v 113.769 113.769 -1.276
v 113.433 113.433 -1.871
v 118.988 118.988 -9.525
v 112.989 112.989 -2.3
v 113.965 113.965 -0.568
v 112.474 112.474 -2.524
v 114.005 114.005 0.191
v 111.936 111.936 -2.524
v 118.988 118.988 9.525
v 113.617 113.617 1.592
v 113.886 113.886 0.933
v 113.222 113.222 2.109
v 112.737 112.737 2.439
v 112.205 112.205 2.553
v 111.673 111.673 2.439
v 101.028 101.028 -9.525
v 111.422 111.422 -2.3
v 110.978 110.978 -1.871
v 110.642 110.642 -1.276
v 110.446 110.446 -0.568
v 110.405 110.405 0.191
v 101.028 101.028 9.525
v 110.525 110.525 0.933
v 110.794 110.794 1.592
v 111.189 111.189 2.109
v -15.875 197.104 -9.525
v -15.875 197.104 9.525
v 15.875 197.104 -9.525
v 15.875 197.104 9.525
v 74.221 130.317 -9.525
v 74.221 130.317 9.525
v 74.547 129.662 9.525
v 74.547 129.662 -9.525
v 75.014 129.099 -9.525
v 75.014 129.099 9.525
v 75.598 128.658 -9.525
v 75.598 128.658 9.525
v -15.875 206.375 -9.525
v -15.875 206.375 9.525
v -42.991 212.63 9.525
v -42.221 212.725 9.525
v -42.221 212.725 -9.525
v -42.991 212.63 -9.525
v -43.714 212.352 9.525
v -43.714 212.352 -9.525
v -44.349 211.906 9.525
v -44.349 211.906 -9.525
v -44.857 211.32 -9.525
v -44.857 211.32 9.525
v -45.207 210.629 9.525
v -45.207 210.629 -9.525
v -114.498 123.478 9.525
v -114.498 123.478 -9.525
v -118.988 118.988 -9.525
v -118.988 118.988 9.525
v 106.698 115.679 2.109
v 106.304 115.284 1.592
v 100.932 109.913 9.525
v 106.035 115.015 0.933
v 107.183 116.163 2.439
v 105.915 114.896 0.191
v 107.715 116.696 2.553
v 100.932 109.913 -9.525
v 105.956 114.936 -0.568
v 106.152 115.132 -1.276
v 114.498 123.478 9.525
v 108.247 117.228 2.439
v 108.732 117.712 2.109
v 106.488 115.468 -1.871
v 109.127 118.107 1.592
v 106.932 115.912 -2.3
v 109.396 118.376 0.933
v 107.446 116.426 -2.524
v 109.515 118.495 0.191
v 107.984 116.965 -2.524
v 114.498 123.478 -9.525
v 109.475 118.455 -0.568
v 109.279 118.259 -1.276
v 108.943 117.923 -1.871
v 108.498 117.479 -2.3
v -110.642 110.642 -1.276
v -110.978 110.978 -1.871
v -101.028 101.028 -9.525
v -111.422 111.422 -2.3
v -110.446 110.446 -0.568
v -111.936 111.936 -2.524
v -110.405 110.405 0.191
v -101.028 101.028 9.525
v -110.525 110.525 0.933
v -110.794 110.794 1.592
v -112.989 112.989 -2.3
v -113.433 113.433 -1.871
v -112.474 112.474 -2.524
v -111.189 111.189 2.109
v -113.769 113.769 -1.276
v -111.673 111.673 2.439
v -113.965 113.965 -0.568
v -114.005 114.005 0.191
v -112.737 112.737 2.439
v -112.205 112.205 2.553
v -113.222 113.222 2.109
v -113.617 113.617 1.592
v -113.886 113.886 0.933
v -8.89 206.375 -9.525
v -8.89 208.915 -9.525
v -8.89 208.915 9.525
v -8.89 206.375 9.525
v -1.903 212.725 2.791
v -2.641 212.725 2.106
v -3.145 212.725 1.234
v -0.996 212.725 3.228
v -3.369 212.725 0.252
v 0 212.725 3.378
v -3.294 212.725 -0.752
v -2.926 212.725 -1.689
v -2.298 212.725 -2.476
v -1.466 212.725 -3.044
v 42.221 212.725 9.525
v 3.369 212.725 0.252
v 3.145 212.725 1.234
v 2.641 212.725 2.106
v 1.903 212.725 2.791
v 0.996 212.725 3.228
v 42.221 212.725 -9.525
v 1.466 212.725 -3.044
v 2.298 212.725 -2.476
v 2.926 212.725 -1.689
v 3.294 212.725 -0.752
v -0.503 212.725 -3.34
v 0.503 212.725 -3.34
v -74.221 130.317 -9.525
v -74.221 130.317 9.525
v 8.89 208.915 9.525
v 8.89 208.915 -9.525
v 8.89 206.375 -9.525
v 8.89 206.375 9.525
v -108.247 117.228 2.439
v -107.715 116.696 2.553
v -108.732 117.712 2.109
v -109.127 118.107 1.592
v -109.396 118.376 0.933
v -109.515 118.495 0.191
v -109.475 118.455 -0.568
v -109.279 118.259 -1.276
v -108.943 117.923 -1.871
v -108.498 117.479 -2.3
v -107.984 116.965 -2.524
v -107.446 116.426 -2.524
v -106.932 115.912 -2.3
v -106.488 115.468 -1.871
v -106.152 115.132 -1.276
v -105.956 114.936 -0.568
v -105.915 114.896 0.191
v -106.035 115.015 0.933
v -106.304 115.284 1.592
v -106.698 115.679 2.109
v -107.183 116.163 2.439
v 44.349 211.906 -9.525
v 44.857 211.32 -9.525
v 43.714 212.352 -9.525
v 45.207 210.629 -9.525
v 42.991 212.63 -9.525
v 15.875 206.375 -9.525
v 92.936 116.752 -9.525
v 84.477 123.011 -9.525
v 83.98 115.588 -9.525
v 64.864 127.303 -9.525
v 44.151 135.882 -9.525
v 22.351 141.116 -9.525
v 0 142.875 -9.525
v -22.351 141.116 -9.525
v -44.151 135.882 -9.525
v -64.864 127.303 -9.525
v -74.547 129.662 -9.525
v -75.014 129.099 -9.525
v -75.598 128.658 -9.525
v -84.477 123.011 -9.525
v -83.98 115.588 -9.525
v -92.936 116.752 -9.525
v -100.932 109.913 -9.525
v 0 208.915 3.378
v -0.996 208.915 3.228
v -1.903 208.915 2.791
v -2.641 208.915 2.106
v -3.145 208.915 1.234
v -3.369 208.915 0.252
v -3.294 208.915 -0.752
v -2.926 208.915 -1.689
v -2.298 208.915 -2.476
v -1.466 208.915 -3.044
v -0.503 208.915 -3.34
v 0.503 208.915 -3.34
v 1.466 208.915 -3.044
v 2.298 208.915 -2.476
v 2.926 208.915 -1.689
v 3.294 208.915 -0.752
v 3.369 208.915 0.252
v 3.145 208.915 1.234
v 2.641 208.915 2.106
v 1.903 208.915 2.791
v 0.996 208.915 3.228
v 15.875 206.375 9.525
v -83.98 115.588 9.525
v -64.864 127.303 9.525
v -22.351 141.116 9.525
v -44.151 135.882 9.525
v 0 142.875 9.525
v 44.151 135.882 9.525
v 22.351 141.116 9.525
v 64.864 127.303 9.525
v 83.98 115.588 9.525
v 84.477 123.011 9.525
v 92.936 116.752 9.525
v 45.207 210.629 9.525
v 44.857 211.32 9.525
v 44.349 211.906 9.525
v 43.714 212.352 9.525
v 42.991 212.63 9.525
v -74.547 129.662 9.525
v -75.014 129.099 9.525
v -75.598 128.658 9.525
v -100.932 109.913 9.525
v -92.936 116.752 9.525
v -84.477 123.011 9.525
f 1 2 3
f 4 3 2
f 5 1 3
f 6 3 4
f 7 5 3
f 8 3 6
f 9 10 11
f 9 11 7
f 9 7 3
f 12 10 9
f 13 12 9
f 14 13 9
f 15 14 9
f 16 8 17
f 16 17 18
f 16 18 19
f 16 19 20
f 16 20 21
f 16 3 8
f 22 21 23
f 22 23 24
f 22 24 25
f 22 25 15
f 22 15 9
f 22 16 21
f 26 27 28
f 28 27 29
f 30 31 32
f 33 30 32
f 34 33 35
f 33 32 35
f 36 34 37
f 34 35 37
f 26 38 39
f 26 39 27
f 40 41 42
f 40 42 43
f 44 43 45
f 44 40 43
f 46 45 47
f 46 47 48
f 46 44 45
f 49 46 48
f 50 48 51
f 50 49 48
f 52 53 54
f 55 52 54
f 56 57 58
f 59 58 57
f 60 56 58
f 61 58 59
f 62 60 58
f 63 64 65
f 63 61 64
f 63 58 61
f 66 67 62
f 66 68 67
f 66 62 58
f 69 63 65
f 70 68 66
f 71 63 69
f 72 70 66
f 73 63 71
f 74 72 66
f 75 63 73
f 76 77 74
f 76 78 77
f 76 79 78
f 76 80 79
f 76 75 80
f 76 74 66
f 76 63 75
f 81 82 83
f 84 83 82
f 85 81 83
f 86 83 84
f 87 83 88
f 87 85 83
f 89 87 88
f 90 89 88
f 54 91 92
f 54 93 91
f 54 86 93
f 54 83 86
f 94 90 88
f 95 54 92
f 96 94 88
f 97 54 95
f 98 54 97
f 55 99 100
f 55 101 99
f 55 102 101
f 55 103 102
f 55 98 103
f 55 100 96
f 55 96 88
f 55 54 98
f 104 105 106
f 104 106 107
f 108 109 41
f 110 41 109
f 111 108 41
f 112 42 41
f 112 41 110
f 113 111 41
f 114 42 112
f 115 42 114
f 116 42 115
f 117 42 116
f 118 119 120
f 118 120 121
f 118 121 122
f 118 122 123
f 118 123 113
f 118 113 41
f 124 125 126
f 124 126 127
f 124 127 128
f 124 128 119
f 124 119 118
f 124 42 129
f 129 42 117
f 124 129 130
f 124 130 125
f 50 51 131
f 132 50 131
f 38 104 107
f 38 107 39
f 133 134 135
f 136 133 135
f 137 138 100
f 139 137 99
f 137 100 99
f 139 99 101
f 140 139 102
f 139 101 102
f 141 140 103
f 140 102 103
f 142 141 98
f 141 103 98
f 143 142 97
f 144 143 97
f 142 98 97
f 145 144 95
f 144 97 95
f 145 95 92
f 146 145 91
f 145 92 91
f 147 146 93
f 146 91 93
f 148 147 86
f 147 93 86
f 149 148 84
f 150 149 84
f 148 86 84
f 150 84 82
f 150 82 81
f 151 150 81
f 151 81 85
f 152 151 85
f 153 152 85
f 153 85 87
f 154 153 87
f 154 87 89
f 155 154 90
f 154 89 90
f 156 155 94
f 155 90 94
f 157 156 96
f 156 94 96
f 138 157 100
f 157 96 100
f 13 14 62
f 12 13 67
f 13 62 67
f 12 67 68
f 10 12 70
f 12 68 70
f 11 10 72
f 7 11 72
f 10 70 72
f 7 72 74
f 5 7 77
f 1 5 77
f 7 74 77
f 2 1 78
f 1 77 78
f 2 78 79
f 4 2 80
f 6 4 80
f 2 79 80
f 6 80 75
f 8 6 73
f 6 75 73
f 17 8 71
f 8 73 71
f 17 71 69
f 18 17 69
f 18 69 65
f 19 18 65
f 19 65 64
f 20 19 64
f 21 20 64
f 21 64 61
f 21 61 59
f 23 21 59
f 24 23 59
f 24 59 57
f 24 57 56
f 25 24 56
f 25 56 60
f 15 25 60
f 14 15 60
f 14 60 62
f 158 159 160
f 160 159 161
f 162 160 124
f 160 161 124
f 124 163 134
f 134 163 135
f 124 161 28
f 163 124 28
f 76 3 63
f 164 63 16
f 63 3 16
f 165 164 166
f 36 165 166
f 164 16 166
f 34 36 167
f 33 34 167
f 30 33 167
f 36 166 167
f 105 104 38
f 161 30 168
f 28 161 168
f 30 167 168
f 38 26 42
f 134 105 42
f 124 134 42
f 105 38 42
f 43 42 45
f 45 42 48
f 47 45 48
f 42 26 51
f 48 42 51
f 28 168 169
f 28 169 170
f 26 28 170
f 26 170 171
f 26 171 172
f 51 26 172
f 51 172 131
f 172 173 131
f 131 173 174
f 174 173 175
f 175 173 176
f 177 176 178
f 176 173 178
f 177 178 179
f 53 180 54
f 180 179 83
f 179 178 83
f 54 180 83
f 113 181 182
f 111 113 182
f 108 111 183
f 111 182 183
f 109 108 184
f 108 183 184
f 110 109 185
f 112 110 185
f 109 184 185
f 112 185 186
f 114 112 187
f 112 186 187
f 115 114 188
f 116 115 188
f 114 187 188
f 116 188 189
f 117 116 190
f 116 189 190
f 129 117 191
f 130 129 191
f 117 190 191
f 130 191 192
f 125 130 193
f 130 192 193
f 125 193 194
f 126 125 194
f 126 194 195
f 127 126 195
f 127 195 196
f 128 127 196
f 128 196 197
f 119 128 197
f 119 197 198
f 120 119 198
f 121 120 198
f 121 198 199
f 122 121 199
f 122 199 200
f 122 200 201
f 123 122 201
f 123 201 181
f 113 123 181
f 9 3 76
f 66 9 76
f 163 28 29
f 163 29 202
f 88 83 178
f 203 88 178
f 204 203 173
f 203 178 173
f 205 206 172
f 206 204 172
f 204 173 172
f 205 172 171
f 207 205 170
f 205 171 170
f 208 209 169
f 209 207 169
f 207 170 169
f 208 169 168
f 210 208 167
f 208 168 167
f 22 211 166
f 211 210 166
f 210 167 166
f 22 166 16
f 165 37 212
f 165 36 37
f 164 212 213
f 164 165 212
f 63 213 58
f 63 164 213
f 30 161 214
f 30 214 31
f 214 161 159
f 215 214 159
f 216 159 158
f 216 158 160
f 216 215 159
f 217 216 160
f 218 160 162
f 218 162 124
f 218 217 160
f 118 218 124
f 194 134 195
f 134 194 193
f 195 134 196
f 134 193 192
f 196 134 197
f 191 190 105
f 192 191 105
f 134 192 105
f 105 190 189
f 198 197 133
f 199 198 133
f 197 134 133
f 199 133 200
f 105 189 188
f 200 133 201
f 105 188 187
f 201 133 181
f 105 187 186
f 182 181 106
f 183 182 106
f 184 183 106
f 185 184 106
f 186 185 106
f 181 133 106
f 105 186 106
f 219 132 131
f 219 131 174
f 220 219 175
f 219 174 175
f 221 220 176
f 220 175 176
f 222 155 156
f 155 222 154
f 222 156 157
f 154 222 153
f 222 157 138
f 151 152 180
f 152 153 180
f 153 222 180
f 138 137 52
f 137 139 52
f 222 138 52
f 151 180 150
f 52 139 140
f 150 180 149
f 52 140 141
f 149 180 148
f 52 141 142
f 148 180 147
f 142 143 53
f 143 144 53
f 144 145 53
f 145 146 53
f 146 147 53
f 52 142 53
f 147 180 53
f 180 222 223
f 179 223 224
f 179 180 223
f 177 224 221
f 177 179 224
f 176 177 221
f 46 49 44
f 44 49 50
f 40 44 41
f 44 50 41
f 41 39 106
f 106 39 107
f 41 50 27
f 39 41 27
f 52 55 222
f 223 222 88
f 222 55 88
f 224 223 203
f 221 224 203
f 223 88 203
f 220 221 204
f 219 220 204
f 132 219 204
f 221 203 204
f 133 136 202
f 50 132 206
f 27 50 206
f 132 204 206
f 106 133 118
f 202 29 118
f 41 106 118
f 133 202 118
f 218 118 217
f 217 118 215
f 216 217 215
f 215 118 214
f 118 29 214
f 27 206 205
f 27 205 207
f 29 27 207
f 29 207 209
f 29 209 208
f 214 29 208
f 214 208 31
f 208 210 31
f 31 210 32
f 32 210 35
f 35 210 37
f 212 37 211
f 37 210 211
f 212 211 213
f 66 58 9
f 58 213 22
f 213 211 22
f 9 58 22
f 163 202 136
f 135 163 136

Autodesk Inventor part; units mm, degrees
ref_plane "YZ Plane" through (0, 0, 0) normal (1, 0, 0) x (0, 1, 0)
ref_plane "XY Plane" through (0, 0, 0) normal (0, 0, 1) x (1, 0, 0)
sketch "Sketch1" plane through (0, 0, 0) normal (0, 0, 1) x (1, 0, 0)
  circle A0 centre (0, 0) radius 142.875
  circle A1 centre (0, 0) radius 149.225
  dimension "innerDiameter" = 285.75
  dimension "outerDiameter" = 298.45
extrude "Extrusion1" add sketch "Sketch1" along normal mid plane 19.05
sketch "Sketch2" plane through (0, 0, 0) normal (0, 0, 1) x (1, 0, 0)
  circle A0 centre (0, 0) radius 142.875 construction
  line L0 (0, 142.875) -> (0, 149.225) construction
  circle A1 centre (0, 0) radius 149.225 construction
  line L1 (0, 142.875) -> (44.45, 142.875)
  line L2 (44.45, 142.875) -> (44.45, 149.225)
  line L3 (44.45, 149.225) -> (19.05, 149.225)
  line L4 (0, 142.875) -> (-44.45, 142.875)
  line L5 (-44.45, 142.875) -> (-44.45, 149.225)
  line L6 (-44.45, 149.225) -> (19.05, 149.225)
  line L7 (371.6693, 35.081) -> (0, 0)
  dimension "halfBaseWidth" = 44.45
  dimension "baseThickness" = 6.35
  dimension "baseHeight" = 0
extrude "Extrusion2" add sketch "Sketch2" along normal mid plane 19.05
sketch "Sketch5" plane through (-44.45, 149.225, 9.525) normal (0, 1, 0) x (1, 0, 0)
  line L0 (0, 19.05) -> (0, 0) projected
  line L1 (88.9, 19.05) -> (88.9, 0) projected
  line L2 (0, 0) -> (88.9, 0)
  line L3 (88.9, 0) -> (88.9, 19.05)
  line L4 (88.9, 19.05) -> (0, 19.05)
  line L5 (0, 19.05) -> (0, 0)
  point P0 (44.45, 9.525)
  point P1 (0, 19.05)
extrude "Extrusion3" add sketch "Sketch5" along normal blind 63.5
sketch "Sketch7" plane through (0, 0, 9.525) normal (0, 0, 1) x (1, 0, 0)
  line L0 (-44.45, 142.875) -> (-44.45, 212.725) projected
  line L1 (-44.45, 212.725) -> (44.45, 212.725) projected
  line L2 (44.45, 142.875) -> (44.45, 212.725) projected
  line L3 (0, 212.725) -> (0, 149.1868) construction
  line L4 (-15.875, 197.104) -> (15.875, 197.104)
  line L5 (15.875, 197.104) -> (15.875, 206.375)
  line L6 (15.875, 206.375) -> (-15.875, 206.375)
  line L7 (-15.875, 206.375) -> (-15.875, 197.104)
  line L8 (-15.875, 197.104) -> (15.875, 206.375) construction
  line L9 (15.875, 197.104) -> (-15.875, 206.375) construction
  point P0 (0, 0)
  point P1 (-38.1, 144.2792)
  point P2 (38.1, 144.2792)
  point P3 (0, 201.7395)
  dimension "screwHoleWidth" = 31.75
  dimension "screwHoleHeight" = 9.271
  dimension "screwHoleSupportThickness" = 6.35
extrude "Extrusion4" cut sketch "Sketch7" against normal through all
sketch "Sketch6" plane through (-44.45, 212.725, 9.525) normal (0, 1, 0) x (1, 0, 0)
  point P0 (44.45, 9.525)
  point P1 (44.45, 9.525)
hole "Hole2" at (0, 212.725, 0) direction (0, -1, 0) diameter 6.7564 depth 6.35 clearance for "Flat Head Machine Screw (82)" size "1/4" standard "Ansi Unified Screw Threads"
ref_plane "Work Plane1" through (0, 0, 0) normal (-0.7071, 0.7071, 0) x (0, 0, 1)
ref_plane "Work Plane2" through (0, 0, 0) normal (0.7071, 0.7071, 0) x (0, 0, 1)
sketch "Sketch11" plane through (0, 0, 0) normal (0, 0, 1) x (1, 0, 0)
  arc A0 (-43.0678, 142.875) -> (43.0678, 142.875) centre (0, 0) ccw projected
  circle A1 centre (0, 0) radius 142.875 projected
  line L0 (-214.9625, 214.9625) -> (217.3313, -217.3313) projected
  line L1 (-101.0279, 101.0279) -> (-96.5378, 105.518)
  line L2 (-101.0279, 101.0279) -> (-94.6779, 101.0279) construction
  line L3 (-96.5378, 105.518) -> (-114.4983, 123.4785)
  line L4 (-96.5378, 105.518) -> (-71.1378, 105.518) construction
  line L5 (-114.4983, 123.4785) -> (-118.9884, 118.9884)
  line L6 (-118.9884, 118.9884) -> (-101.0279, 101.0279)
  line L7 (-101.0279, 101.0279) -> (-105.518, 96.5378)
  line L8 (-105.518, 96.5378) -> (-123.4785, 114.4983)
  line L9 (-123.4785, 114.4983) -> (-118.9884, 118.9884)
  point P0 (38.1, 144.2792)
  point P1 (-38.1, 144.2792)
  point P2 (-109.9126, 100.9323)
  point P3 (-100.9323, 109.9126)
  dimension "d47" = 6.35
  dimension "d48" = 45
  dimension "d49" = 25.4
  dimension "d50" = 135
extrude "Extrusion7" add sketch "Sketch11" along normal mid plane 19.05 contours A0 L0 L5 L3 | A0 L8 L9 L0
sketch "Sketch12" plane through (-114.4983, 123.4785, -9.525) normal (0.7071, 0.7071, 0) x (-0.7071, 0.7071, 0)
  line L0 (0, 0) -> (0, 19.05) projected
  line L1 (-19.1852, 19.05) -> (0, 19.05) projected
  line L2 (-19.1852, 0) -> (-19.1852, 19.05) projected
  line L3 (0, 0) -> (-19.1852, 0) projected
  line L4 (-9.5926, 19.05) -> (-9.5926, 0) construction
  line L5 (0, 9.525) -> (-19.1852, 9.525) construction
  point P0 (-168.275, 9.525)
  point P1 (-9.5926, 9.525)
hole "Hole4" at (-107.7153, 116.6955, 0) direction (-0.7071, -0.7071, 0) diameter 5.1054 depth 12.7 clearance for "Flat Head Machine Screw (82)" size "#10" standard "Ansi Unified Screw Threads"
pattern_circular "Circular Pattern1" count 4 over 360 about axis through (0, 0, -10) along (0, 0, 1) of "Extrusion7", "Hole4"
sketch "Sketch13" plane through (0, 0, 9.525) normal (0, 0, 1) x (1, 0, 0)
  line L0 (-15.875, 206.375) -> (15.875, 206.375) projected
  line L1 (-44.45, 212.725) -> (44.45, 212.725) projected
  line L2 (0, 208.915) -> (8.89, 208.915)
  line L3 (8.89, 208.915) -> (8.89, 206.375)
  line L4 (8.89, 206.375) -> (0, 206.375)
  line L5 (0, 208.915) -> (0, 206.375)
  line L6 (15.875, 206.375) -> (-15.875, 206.375)
  line L7 (0, 208.915) -> (-8.89, 208.915)
  line L8 (-8.89, 208.915) -> (-8.89, 206.375)
  point P0 (0, 0)
  dimension "d63" = 8.89
  dimension "d64" = 2.54
extrude "Extrusion8" cut sketch "Sketch13" against normal through all
sketch "Sketch14" plane through (0, 0, 9.525) normal (0, 0, 1) x (1, 0, 0)
  point P0 (0, 0)
sketch "Sketch15" plane through (0, 0, 0) normal (0, 0, 1) x (1, 0, 0)
  arc A0 (-43.0678, 142.875) -> (-100.9323, 109.9126) centre (0, 0) ccw projected
  line L0 (-43.0678, 142.875) -> (-44.45, 142.875) projected
  line L1 (44.45, 142.875) -> (43.0678, 142.875) projected
  arc A1 (100.9323, 109.9126) -> (43.0678, 142.875) centre (0, 0) ccw projected
  line L2 (-44.45, 142.875) -> (-44.45, 142.451)
  line L3 (-44.45, 142.875) -> (-43.0678, 142.875)
  line L4 (43.0678, 142.875) -> (44.45, 142.875)
  line L5 (44.45, 142.875) -> (44.45, 142.451)
  arc A2 (-43.0678, 142.875) -> (-44.45, 142.451) centre (0, 0) ccw
  arc A3 (44.45, 142.451) -> (43.0678, 142.875) centre (0, 0) ccw
extrude "Extrusion9" add sketch "Sketch15" along normal mid plane 19.05
sketch "Sketch16" plane through (0, 0, 0) normal (0, 0, 1) x (1, 0, 0)
  line L0 (44.45, 142.451) -> (44.45, 212.725) projected
  line L1 (-44.45, 142.451) -> (-44.45, 212.725) projected
  arc A0 (-44.45, 142.451) -> (-100.9323, 109.9126) centre (0, 0) ccw projected
  arc A1 (100.9323, 109.9126) -> (44.45, 142.451) centre (0, 0) ccw projected
  line L2 (0, 0) -> (-74.6125, 129.2326) construction
  line L3 (0, 0) -> (0, 149.225) construction
  line L4 (0, 0) -> (74.6125, 129.2326) construction
  line L5 (-44.45, 212.725) -> (-74.6125, 129.2326)
  line L6 (-44.45, 142.451) -> (-44.45, 212.725) projected
  line L7 (-44.45, 142.451) -> (-44.45, 212.725)
  line L8 (44.45, 212.725) -> (44.45, 142.451)
  line L9 (44.45, 212.725) -> (74.6125, 129.2326)
  arc A2 (74.6125, 129.2326) -> (44.45, 142.451) centre (0, 0) ccw
  arc A3 (-44.45, 142.451) -> (-74.6125, 129.2326) centre (0, 0) ccw
  dimension "d69" = 30
  dimension "d70" = 30
extrude "Extrusion10" add sketch "Sketch16" along normal mid plane 19.05
fillet "Fillet1" radius 3.175 2 edges at (-74.6125, 129.2326, 0) (74.6125, 129.2326, 0)
fillet "Fillet2" radius 3.175 2 edges at (-44.45, 212.725, 0) (44.45, 212.725, 0)
split "Split3" plane through (0, 0, 0) removes the side toward (-0.7071, -0.7071, 0)
split "Split4" plane through (0, 0, 0) removes the side toward (0.7071, -0.7071, 0)
equation "\"outerDiameter\" = innerDiameter + 2 * ringThicknessRadius"
equation "\"d7\" = ringWidth"
equation "\"d51\" = ringWidth"
equation "\"d67\" = ringWidth"
equation "\"d71\" = ringWidth"
equation "\"ringThicknessRadius\" = 6.35"
equation "\"ringWidth\" = 19.05"
properties part number "mountFirstQuater" material "PET Plastic"
